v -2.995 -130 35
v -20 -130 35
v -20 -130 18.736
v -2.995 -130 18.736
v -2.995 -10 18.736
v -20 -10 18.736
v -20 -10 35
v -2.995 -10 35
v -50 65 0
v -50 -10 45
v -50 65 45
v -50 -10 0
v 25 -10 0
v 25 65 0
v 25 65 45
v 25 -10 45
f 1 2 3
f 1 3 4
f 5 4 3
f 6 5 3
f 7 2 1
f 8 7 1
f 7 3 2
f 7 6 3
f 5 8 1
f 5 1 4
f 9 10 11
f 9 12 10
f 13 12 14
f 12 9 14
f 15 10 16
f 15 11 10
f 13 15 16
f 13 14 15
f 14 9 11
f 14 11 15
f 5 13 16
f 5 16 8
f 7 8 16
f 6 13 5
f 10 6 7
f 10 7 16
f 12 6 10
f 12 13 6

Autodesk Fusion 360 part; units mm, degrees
sketch "Sketch1" plane through (0, 0, 0) normal (0, 0, 1) x (1, 0, 0)
  line L0 (-50, 65) -> (25, 65)
  line L1 (25, 65) -> (25, -10)
  line L2 (25, -10) -> (-50, -10)
  line L3 (-50, -10) -> (-50, 65)
extrude "Extrude1" add sketch "Sketch1" along normal blind 45
sketch "Sketch2" plane through (0, -10, 0) normal (0, -1, 0) x (1, 0, 0)
  line L0 (-50, 0) -> (25, 0)
  line L1 (25, 0) -> (25, 45)
  line L2 (25, 45) -> (-50, 45)
  line L3 (-50, 45) -> (-50, 0)
  line L4 (-20, 35) -> (-2.9952, 35)
  line L5 (-2.9952, 35) -> (-2.9952, 18.7359)
  line L6 (-2.9952, 18.7359) -> (-20, 18.7359)
  line L7 (-20, 18.7359) -> (-20, 35)
extrude "Extrude2" add sketch "Sketch2" along normal blind 120 contours L4 L5 L6 L7
